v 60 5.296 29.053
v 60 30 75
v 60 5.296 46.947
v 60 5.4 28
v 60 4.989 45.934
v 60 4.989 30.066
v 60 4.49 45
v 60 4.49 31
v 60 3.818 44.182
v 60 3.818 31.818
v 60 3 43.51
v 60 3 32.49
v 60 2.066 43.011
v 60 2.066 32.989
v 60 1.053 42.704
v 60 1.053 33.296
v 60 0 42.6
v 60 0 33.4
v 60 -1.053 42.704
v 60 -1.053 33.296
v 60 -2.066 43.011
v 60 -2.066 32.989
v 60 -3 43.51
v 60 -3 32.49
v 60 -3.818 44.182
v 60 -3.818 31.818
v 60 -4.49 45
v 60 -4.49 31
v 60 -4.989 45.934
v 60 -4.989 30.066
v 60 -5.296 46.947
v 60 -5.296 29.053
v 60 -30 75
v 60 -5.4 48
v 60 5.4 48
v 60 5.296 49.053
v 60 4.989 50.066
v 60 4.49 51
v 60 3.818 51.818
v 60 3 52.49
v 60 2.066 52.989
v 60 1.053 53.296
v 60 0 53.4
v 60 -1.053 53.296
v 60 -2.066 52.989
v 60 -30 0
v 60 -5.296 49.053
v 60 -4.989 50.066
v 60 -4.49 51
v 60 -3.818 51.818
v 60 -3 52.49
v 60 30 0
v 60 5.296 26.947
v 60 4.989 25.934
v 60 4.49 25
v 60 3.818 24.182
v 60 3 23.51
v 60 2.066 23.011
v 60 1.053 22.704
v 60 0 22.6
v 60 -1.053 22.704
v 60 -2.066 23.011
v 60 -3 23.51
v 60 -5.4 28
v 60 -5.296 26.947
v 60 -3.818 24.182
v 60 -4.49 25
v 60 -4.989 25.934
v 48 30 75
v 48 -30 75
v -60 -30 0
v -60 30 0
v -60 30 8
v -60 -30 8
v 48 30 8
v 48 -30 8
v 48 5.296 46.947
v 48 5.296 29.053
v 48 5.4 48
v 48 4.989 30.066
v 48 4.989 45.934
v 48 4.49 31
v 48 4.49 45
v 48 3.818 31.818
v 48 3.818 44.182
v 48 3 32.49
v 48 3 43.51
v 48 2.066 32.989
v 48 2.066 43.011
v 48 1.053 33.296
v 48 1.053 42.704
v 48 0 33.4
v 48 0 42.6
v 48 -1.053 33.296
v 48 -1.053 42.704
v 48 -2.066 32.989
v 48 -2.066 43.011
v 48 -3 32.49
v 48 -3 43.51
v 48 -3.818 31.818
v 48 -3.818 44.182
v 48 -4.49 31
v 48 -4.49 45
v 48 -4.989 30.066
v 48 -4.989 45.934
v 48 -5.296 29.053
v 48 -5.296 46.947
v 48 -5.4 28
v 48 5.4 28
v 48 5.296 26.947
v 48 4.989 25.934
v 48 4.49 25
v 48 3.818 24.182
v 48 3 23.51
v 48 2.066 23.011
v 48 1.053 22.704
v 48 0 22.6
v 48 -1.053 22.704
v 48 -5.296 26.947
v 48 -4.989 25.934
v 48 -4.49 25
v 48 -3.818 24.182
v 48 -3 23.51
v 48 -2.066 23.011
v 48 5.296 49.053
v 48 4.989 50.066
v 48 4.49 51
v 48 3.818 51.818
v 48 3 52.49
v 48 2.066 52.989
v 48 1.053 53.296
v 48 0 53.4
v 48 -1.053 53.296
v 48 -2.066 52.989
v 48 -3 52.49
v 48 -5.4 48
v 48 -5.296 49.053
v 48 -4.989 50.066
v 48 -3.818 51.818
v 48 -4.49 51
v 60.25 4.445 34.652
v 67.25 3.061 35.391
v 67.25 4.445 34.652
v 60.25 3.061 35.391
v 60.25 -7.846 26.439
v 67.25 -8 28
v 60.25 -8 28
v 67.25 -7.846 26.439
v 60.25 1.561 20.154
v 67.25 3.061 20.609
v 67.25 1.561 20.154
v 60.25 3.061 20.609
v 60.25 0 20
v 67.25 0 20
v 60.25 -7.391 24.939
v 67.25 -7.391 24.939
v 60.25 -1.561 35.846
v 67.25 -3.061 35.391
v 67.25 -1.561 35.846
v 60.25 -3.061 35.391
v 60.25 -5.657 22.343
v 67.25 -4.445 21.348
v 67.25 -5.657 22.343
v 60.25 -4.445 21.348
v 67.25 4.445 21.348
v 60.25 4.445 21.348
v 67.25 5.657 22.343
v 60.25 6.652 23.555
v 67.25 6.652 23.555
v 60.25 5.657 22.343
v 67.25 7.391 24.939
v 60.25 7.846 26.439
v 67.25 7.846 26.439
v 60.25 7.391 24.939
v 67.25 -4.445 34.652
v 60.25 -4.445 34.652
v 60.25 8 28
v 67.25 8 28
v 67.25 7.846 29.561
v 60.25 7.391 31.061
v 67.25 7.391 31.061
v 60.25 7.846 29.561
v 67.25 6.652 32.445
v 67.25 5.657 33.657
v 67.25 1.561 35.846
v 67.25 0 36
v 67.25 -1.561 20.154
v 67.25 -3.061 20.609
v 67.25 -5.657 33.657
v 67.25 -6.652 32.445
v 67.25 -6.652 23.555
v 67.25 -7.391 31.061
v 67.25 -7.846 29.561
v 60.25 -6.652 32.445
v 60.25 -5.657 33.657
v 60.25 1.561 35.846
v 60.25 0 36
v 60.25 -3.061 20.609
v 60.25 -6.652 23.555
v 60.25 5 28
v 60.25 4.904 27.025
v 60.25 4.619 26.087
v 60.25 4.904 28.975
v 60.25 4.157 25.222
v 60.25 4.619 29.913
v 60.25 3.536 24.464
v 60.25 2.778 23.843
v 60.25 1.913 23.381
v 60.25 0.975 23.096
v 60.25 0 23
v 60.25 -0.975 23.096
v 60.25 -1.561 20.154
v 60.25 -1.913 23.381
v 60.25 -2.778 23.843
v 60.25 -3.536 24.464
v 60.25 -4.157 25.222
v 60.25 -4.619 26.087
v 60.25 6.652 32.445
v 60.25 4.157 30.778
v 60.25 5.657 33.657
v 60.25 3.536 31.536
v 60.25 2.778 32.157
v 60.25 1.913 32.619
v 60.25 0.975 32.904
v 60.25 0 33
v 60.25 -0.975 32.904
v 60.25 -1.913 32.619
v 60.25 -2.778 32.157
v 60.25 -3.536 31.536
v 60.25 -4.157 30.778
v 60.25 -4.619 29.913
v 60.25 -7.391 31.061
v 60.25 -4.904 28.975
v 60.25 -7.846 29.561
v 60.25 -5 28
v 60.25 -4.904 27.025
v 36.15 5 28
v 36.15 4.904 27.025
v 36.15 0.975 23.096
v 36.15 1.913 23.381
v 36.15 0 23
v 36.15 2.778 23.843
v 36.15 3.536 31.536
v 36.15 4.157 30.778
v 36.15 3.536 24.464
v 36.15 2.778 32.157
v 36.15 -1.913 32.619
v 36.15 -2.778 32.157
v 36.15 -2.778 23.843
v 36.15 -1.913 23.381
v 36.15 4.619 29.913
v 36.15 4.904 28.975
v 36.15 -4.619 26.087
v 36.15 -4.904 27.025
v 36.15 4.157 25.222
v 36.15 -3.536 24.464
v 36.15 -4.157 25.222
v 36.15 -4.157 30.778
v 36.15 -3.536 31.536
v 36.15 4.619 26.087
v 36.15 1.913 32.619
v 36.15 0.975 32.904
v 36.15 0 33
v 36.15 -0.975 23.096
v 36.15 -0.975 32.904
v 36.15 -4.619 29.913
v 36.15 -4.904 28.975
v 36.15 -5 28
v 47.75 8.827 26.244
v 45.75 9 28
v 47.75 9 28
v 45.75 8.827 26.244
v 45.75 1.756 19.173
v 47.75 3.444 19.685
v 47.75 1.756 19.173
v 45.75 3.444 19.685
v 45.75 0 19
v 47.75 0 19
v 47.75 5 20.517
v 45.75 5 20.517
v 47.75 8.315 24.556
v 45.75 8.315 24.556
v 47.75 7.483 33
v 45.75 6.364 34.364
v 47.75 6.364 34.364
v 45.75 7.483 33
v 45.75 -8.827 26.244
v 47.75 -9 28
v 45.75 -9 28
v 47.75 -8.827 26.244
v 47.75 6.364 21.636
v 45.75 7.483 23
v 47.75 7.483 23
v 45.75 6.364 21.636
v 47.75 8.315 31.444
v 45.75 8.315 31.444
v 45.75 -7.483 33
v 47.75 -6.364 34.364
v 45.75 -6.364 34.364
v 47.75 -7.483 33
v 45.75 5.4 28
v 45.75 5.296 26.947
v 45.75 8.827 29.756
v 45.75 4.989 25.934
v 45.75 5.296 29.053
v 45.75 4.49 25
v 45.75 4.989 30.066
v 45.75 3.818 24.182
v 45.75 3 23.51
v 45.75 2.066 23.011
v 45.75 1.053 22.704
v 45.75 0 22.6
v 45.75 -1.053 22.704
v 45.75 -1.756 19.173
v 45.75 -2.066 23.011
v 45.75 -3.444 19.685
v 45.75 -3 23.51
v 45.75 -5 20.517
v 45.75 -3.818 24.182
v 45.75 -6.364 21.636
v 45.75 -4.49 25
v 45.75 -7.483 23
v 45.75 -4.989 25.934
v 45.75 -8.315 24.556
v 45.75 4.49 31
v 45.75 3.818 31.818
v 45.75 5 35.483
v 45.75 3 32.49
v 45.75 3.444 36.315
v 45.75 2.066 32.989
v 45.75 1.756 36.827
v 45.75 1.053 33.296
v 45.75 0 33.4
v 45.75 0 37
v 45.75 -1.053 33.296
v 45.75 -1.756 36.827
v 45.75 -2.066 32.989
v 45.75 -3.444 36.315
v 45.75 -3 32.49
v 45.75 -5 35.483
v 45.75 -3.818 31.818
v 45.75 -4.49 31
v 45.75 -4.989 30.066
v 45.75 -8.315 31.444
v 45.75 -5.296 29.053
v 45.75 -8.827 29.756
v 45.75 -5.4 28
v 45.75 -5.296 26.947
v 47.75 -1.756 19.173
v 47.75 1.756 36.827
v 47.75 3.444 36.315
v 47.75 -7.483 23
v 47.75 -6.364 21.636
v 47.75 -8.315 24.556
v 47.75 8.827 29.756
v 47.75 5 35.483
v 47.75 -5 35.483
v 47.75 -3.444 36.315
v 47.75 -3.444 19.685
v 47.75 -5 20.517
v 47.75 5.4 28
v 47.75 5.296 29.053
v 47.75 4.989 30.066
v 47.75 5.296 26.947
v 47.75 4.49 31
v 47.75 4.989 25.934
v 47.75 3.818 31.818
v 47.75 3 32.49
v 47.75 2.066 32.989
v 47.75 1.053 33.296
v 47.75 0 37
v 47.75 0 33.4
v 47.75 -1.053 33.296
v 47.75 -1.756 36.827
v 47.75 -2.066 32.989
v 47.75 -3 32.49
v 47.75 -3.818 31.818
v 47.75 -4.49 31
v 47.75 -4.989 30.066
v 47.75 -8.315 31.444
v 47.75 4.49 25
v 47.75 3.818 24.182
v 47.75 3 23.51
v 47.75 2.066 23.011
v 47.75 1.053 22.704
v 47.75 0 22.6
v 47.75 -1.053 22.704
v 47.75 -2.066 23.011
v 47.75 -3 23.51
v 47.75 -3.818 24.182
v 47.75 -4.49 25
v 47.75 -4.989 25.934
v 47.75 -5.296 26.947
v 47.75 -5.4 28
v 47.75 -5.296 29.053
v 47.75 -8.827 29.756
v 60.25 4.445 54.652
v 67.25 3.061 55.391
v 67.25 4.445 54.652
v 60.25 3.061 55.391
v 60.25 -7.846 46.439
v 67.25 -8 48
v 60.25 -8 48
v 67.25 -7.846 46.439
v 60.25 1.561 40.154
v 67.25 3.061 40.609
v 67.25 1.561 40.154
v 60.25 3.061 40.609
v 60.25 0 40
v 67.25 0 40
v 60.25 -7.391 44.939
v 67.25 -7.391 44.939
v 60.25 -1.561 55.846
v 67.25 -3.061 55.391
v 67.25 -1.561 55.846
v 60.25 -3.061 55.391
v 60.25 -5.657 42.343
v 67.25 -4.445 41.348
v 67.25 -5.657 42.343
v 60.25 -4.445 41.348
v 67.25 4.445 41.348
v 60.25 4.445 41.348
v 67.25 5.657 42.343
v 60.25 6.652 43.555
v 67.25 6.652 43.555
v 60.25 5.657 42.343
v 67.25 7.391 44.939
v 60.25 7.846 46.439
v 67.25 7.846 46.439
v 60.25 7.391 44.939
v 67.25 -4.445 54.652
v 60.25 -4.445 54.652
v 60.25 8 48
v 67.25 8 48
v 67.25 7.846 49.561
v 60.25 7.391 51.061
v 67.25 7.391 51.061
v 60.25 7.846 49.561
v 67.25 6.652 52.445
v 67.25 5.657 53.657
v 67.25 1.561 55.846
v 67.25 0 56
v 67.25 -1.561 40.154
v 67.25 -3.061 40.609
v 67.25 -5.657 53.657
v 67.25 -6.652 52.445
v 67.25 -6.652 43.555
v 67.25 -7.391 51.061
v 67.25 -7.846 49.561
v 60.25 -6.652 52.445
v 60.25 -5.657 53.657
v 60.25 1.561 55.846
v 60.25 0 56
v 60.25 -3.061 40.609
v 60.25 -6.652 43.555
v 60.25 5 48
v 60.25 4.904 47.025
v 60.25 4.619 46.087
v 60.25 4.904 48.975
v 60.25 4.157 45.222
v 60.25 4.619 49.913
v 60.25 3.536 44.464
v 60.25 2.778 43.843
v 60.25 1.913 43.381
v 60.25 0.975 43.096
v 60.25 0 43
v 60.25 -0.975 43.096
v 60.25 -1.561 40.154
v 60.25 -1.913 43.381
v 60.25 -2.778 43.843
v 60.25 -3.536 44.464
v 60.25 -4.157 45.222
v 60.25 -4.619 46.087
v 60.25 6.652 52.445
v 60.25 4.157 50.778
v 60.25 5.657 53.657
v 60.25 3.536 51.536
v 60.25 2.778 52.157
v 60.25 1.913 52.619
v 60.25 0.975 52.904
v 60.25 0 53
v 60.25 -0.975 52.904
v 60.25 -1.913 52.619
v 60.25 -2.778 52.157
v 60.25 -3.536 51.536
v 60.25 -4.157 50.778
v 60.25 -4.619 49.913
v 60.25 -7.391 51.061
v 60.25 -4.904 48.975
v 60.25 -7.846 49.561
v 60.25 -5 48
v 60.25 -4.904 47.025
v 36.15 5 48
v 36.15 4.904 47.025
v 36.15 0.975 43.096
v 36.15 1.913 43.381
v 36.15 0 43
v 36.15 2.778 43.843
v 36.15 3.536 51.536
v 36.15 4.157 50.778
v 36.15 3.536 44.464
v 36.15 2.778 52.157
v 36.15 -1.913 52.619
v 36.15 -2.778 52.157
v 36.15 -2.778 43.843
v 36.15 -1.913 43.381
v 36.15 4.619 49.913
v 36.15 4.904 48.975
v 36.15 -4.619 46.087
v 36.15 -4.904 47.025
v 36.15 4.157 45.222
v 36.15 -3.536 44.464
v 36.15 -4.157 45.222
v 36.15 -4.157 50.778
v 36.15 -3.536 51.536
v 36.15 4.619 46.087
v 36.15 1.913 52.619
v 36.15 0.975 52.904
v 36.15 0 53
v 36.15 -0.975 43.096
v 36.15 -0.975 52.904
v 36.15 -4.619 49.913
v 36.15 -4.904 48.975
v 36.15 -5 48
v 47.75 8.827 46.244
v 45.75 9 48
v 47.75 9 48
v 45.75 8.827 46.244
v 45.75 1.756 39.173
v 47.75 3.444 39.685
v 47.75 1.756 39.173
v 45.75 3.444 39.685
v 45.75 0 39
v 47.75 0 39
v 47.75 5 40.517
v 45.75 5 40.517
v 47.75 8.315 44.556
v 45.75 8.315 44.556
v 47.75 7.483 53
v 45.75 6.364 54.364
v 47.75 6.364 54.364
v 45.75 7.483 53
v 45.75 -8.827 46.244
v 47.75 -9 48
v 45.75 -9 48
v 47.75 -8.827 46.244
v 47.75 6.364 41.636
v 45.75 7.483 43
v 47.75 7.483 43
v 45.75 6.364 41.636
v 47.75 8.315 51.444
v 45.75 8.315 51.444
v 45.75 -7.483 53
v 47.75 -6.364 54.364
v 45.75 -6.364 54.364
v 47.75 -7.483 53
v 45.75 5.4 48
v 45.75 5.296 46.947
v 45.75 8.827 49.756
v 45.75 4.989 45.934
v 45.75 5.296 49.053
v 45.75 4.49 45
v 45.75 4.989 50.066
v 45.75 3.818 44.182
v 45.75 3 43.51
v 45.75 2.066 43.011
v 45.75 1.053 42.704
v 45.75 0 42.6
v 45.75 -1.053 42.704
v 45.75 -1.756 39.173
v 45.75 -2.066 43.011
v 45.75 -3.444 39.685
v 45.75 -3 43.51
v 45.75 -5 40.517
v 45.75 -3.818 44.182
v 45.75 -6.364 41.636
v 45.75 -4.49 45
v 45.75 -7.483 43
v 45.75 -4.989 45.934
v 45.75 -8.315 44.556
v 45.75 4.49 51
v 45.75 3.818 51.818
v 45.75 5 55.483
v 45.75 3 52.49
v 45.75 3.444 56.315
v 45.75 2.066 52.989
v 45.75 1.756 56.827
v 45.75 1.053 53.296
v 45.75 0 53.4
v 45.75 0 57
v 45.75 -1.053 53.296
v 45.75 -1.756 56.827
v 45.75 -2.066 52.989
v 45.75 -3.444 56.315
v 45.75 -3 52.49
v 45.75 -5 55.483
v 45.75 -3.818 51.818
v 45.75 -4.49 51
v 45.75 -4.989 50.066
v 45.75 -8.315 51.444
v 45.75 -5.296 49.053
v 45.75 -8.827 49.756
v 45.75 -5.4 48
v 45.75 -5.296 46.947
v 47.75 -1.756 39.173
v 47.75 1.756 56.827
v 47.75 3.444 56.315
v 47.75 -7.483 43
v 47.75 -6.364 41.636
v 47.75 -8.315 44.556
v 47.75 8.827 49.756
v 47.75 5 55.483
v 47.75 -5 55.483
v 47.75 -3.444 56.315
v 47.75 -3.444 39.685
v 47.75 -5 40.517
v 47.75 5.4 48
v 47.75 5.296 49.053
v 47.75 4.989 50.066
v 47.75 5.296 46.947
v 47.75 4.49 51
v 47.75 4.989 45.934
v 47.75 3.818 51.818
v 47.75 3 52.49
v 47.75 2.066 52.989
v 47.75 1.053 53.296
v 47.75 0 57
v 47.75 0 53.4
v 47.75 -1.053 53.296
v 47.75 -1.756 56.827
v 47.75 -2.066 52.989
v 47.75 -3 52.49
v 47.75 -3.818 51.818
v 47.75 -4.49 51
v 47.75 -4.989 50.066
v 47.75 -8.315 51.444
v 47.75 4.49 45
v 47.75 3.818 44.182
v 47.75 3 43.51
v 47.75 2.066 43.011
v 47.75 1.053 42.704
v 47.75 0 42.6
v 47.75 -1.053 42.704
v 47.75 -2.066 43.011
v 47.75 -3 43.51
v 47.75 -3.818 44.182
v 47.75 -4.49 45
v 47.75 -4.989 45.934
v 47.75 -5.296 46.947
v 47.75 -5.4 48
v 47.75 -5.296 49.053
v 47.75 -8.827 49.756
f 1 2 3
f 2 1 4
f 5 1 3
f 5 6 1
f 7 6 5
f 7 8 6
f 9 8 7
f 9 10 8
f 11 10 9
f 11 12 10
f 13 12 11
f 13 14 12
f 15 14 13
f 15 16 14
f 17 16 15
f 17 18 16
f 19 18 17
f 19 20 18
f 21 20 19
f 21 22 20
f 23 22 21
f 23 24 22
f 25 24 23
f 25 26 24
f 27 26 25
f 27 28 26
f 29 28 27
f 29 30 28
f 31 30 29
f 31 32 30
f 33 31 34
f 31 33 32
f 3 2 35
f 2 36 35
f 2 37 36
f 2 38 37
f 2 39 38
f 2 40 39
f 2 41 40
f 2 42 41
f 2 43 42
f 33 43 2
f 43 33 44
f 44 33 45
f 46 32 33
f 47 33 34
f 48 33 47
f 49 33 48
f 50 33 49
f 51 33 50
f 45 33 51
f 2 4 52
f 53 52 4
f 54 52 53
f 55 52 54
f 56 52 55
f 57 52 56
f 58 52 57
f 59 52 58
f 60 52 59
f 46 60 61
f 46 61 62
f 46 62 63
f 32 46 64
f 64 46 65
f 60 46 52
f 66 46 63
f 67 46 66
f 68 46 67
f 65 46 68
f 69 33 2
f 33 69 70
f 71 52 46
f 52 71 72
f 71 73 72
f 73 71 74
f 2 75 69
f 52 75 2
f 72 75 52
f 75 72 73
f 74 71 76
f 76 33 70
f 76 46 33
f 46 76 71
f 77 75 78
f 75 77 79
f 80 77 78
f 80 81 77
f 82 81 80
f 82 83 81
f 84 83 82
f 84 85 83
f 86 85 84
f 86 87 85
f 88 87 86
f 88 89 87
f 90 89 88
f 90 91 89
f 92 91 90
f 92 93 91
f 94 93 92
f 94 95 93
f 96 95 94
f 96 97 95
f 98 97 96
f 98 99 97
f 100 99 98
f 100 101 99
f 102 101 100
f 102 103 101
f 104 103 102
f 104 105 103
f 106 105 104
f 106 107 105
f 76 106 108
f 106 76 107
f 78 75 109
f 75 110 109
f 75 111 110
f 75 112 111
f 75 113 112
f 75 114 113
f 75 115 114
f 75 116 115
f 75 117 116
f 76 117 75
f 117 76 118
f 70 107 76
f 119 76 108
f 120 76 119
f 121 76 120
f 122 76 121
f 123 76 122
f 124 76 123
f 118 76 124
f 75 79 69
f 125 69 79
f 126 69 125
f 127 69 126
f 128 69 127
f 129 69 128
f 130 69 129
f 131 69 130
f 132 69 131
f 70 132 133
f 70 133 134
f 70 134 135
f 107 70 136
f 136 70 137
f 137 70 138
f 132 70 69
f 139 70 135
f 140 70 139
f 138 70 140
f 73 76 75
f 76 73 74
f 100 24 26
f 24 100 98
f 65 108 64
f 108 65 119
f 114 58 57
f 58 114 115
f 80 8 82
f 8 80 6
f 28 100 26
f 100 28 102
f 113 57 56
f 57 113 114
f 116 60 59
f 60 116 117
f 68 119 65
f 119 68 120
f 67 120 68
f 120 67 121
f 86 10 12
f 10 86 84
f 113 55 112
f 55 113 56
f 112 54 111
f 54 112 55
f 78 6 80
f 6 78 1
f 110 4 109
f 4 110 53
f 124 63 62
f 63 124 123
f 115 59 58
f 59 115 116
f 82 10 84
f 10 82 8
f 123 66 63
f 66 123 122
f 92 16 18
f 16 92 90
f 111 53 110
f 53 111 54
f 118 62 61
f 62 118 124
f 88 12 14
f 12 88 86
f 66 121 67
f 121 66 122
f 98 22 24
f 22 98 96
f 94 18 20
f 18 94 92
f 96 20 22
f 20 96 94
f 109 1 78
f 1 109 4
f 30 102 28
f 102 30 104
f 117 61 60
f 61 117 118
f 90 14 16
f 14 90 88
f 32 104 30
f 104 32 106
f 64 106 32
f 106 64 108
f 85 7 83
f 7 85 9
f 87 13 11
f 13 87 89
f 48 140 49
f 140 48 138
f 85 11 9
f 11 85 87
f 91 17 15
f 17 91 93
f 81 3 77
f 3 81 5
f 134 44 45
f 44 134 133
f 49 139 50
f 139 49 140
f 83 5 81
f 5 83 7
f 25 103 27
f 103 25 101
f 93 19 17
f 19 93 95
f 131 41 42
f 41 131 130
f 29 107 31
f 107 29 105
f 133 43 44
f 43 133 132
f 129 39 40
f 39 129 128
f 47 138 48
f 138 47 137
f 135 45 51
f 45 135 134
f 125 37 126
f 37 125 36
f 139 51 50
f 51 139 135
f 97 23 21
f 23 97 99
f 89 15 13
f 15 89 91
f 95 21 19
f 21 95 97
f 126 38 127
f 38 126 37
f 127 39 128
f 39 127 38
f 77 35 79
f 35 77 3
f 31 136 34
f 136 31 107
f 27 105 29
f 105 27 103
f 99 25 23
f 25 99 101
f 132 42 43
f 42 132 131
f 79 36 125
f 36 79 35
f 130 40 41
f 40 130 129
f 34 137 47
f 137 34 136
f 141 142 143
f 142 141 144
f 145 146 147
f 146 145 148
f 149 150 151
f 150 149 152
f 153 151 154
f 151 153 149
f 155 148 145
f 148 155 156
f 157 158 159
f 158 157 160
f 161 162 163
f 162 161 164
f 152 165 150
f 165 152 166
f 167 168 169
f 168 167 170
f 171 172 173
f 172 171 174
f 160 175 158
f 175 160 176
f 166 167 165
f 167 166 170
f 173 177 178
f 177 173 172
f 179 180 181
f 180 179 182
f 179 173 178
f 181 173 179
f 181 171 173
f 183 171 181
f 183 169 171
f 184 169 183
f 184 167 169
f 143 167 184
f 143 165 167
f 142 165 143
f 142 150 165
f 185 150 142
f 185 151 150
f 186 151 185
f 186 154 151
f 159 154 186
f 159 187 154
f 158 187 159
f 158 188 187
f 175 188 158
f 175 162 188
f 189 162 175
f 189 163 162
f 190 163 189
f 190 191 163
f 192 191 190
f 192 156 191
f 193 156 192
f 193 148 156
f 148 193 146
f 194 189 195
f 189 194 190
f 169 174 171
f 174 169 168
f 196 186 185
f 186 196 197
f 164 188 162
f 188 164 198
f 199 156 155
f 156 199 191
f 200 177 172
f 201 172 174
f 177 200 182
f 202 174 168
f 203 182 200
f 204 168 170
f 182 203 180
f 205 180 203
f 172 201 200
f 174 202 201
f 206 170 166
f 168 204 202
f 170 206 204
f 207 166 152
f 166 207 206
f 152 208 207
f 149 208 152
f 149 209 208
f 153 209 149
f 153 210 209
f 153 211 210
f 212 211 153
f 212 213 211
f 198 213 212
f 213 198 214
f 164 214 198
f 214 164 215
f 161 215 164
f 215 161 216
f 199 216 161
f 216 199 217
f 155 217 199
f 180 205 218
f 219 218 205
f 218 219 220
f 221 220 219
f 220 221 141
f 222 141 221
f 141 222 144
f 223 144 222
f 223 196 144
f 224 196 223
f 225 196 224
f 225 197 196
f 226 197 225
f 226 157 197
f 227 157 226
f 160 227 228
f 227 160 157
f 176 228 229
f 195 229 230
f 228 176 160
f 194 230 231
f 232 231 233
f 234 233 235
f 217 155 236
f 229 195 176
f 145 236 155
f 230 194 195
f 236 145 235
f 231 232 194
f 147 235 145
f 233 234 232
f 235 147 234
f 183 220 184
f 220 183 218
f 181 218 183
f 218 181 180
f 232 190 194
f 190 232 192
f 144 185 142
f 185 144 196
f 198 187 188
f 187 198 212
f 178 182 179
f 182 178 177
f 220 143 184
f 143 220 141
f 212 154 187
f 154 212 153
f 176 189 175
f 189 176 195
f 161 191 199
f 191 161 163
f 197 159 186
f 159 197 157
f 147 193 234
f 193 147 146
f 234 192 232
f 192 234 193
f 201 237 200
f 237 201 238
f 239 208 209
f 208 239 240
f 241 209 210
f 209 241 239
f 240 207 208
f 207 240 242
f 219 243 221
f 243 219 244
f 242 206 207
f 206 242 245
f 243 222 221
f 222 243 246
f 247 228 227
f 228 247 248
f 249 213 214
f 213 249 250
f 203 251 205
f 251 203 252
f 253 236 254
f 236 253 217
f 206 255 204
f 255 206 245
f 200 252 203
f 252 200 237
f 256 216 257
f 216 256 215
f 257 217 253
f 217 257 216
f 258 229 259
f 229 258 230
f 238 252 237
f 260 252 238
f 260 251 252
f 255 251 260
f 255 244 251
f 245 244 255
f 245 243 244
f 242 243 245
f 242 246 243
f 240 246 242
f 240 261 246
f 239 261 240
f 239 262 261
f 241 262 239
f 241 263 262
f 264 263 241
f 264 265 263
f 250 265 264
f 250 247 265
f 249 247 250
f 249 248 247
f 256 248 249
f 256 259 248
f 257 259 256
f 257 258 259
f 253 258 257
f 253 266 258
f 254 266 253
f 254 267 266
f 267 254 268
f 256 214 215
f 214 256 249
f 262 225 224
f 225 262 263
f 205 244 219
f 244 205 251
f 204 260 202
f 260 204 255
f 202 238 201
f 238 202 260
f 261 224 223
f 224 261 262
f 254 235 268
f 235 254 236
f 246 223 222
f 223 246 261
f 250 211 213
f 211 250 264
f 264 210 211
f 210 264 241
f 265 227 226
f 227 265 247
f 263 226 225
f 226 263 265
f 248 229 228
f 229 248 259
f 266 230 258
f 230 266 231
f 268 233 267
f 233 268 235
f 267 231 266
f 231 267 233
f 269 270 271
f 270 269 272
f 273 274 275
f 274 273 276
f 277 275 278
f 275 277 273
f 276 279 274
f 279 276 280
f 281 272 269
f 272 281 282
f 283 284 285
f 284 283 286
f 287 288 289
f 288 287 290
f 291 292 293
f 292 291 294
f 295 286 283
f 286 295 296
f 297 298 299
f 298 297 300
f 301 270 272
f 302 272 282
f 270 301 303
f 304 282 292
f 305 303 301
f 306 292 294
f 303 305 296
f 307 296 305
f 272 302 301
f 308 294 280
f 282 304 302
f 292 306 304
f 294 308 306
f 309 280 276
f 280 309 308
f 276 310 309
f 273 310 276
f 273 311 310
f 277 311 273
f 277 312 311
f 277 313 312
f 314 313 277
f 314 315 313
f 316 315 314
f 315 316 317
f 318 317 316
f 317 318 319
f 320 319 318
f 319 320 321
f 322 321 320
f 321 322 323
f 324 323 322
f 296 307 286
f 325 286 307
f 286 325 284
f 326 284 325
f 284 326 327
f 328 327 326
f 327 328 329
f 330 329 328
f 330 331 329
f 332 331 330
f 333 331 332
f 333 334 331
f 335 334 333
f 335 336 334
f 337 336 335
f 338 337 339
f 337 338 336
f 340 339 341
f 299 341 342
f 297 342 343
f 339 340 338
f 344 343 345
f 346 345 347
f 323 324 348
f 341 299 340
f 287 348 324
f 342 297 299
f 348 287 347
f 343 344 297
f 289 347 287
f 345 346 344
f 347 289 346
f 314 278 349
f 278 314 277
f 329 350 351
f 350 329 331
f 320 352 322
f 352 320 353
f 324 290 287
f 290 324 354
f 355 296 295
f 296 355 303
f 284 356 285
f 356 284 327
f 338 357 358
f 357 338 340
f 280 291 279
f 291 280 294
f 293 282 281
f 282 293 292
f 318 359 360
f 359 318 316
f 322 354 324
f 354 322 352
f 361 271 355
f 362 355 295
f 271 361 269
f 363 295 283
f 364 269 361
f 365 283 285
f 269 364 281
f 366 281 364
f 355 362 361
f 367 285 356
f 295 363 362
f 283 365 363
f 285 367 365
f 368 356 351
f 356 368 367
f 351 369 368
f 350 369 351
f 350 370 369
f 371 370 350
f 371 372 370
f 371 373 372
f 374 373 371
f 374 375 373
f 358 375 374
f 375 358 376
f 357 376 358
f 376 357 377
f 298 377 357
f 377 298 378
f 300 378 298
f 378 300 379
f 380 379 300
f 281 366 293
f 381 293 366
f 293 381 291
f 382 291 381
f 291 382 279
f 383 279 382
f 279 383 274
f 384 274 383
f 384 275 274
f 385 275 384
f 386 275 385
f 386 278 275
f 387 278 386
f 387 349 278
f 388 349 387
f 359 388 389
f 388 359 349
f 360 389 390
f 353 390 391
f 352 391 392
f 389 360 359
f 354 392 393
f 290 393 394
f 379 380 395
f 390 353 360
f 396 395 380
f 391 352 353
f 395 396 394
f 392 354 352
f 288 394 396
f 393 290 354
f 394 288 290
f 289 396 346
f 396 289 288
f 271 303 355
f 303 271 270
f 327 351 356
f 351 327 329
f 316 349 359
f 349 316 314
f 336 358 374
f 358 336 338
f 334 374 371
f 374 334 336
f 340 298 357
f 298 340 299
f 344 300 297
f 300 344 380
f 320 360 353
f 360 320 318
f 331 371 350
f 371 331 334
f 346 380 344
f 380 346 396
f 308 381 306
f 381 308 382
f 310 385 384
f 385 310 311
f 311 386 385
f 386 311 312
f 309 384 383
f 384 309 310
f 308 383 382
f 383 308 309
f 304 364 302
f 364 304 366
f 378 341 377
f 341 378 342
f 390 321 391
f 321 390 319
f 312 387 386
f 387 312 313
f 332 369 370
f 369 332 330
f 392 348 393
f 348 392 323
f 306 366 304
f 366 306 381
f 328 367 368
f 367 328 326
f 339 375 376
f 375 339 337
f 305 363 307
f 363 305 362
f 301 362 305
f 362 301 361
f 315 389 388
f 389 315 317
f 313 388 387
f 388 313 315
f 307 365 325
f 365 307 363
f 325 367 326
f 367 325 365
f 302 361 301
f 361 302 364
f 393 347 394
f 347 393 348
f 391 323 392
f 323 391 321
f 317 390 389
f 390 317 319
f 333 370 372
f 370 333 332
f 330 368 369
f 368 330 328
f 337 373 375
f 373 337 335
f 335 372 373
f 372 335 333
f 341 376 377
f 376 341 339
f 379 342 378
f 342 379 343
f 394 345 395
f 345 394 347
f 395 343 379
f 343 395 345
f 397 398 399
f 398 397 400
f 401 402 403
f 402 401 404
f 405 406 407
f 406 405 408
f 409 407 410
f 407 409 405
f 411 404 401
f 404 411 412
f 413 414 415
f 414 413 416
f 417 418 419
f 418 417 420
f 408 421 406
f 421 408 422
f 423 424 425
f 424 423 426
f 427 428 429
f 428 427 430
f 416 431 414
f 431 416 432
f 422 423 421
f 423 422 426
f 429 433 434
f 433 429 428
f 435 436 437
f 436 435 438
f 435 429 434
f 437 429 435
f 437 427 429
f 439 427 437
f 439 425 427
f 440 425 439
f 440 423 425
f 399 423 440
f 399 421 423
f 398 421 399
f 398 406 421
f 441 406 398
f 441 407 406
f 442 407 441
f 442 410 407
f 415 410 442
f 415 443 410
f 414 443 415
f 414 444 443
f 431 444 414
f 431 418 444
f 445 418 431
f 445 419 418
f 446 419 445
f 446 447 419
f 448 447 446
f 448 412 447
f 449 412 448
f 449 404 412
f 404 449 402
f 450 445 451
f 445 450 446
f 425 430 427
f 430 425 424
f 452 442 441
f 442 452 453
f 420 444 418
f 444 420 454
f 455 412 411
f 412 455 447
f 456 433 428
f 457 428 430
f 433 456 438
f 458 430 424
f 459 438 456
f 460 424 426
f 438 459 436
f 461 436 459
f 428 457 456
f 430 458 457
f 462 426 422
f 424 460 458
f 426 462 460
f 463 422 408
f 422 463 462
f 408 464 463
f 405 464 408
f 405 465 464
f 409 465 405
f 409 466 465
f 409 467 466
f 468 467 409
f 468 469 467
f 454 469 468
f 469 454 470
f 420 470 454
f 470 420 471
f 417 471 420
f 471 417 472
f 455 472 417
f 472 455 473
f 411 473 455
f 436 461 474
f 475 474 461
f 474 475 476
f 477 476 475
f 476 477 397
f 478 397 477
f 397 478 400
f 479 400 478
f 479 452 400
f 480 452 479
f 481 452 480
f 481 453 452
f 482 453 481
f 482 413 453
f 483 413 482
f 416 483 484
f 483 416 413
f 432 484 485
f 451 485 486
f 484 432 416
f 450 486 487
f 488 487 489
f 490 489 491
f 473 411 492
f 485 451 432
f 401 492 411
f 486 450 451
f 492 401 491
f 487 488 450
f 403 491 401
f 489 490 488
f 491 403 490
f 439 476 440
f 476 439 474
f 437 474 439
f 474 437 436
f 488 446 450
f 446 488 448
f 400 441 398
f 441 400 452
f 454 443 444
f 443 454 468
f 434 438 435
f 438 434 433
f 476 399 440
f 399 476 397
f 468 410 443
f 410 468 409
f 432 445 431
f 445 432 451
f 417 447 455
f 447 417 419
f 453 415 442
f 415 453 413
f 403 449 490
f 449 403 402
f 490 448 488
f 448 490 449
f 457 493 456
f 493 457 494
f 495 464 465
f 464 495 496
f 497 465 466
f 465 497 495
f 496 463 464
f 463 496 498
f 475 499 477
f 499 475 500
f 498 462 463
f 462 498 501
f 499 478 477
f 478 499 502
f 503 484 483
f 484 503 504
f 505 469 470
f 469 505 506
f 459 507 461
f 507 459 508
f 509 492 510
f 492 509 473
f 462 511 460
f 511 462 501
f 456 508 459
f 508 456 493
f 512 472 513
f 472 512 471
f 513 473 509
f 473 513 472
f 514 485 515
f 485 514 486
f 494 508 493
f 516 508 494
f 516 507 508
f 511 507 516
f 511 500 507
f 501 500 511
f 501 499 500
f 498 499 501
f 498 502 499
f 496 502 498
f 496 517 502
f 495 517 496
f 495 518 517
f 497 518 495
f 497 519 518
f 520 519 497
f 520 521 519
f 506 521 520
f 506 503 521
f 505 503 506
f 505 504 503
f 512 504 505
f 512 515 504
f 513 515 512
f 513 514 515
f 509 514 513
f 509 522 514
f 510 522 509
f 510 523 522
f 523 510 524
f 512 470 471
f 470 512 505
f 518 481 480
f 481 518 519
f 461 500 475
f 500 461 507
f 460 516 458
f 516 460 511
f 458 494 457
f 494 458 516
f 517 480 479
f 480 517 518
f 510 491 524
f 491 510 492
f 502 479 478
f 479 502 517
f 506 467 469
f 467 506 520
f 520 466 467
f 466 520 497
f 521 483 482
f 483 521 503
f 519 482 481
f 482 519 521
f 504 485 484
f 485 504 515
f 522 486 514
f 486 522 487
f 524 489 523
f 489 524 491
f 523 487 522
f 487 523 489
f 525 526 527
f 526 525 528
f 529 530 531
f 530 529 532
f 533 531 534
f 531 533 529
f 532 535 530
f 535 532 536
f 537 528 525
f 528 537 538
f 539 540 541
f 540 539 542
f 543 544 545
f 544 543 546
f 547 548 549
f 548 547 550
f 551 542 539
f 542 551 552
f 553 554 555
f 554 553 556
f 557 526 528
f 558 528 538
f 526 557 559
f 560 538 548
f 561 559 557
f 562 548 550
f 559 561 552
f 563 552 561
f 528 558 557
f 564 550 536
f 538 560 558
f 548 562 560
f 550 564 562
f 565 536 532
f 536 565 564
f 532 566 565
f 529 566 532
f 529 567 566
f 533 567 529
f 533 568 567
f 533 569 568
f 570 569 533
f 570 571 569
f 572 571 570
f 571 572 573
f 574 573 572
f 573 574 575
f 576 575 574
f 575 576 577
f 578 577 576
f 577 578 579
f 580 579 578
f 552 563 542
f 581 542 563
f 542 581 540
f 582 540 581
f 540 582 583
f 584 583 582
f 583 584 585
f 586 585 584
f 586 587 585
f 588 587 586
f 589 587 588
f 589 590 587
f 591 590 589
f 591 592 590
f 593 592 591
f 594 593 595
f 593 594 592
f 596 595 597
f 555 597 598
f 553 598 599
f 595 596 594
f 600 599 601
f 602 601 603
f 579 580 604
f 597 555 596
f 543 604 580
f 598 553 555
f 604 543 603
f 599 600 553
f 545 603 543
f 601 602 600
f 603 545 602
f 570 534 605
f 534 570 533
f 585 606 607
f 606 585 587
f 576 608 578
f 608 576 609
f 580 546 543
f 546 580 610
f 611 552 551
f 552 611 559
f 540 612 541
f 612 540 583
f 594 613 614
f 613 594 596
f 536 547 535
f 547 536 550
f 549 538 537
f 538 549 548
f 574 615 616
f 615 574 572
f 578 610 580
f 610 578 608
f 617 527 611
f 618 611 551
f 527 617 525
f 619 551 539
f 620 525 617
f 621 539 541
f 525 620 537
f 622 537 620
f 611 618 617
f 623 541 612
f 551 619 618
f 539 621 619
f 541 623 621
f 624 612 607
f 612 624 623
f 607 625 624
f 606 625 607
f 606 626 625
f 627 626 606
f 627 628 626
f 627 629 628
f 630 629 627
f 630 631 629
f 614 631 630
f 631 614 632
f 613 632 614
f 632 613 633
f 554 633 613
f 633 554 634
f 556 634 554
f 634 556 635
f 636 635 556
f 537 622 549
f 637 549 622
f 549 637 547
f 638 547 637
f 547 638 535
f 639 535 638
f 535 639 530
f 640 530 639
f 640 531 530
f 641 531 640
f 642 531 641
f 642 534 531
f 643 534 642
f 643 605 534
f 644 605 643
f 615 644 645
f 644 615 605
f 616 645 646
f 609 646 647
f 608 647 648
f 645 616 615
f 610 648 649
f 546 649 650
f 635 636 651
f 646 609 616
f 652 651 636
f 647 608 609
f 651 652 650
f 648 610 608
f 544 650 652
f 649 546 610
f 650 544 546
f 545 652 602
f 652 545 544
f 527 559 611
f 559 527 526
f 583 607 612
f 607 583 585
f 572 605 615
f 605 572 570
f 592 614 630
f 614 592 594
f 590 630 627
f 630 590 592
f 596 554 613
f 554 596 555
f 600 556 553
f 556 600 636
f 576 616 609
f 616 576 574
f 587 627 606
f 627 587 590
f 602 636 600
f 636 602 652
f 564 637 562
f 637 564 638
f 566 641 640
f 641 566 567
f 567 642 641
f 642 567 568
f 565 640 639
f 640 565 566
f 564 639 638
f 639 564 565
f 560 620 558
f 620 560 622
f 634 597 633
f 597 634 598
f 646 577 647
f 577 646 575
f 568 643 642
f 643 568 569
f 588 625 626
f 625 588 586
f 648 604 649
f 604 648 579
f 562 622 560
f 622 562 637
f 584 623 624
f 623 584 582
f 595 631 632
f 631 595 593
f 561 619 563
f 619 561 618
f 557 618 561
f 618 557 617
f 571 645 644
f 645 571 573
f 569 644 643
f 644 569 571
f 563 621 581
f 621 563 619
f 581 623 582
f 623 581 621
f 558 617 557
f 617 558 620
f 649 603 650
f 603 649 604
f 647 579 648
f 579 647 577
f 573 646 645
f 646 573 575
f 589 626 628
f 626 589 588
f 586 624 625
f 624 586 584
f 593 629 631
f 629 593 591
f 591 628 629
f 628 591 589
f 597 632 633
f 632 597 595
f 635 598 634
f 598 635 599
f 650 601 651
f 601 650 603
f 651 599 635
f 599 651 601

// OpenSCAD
$fn = 32;

// ------------------------------------------------------------------------
// Bolted bracket: 120 x 60 mm bracket with 2 bolt joints
// Every part is its own module, assembly() places them once.
// ------------------------------------------------------------------------

// --- part 1 ---
module bracket() {
  difference() {
    translate([-60, -30, 0]) cube([120, 60, 75]);
    translate([-61, -31, 8]) cube([109, 62, 68]);
    translate([54, 0, 28]) rotate([0, 90, 0]) cylinder(h = 14, d = 10.8, center = true);
    translate([54, 0, 48]) rotate([0, 90, 0]) cylinder(h = 14, d = 10.8, center = true);
  }
}

// --- part 2 ---
module bolt1() {
  cylinder(h = 7, d = 16);
  translate([0, 0, -24.1]) cylinder(h = 24.1, d = 10);
}

// --- part 3 ---
module washer1() {
  difference() {
      translate([0, 0, 0]) cylinder(h = 2, d = 18);
      translate([0, 0, -1]) cylinder(h = 4, d = 10.8);
    }
}

// --- part 4 ---
module bolt2() {
  cylinder(h = 7, d = 16);
  translate([0, 0, -24.1]) cylinder(h = 24.1, d = 10);
}

// --- part 5 ---
module washer2() {
  difference() {
      translate([0, 0, 0]) cylinder(h = 2, d = 18);
      translate([0, 0, -1]) cylinder(h = 4, d = 10.8);
    }
}

// --- assembly ---
module assembly() {
  translate([0, 0, 0]) rotate([0, 0, 0]) bracket();
  translate([60.25, 0, 28]) rotate([0, 90, 0]) bolt1();
  translate([45.75, 0, 28]) rotate([0, 90, 0]) washer1();
  translate([60.25, 0, 48]) rotate([0, 90, 0]) bolt2();
  translate([45.75, 0, 48]) rotate([0, 90, 0]) washer2();
}

assembly();
